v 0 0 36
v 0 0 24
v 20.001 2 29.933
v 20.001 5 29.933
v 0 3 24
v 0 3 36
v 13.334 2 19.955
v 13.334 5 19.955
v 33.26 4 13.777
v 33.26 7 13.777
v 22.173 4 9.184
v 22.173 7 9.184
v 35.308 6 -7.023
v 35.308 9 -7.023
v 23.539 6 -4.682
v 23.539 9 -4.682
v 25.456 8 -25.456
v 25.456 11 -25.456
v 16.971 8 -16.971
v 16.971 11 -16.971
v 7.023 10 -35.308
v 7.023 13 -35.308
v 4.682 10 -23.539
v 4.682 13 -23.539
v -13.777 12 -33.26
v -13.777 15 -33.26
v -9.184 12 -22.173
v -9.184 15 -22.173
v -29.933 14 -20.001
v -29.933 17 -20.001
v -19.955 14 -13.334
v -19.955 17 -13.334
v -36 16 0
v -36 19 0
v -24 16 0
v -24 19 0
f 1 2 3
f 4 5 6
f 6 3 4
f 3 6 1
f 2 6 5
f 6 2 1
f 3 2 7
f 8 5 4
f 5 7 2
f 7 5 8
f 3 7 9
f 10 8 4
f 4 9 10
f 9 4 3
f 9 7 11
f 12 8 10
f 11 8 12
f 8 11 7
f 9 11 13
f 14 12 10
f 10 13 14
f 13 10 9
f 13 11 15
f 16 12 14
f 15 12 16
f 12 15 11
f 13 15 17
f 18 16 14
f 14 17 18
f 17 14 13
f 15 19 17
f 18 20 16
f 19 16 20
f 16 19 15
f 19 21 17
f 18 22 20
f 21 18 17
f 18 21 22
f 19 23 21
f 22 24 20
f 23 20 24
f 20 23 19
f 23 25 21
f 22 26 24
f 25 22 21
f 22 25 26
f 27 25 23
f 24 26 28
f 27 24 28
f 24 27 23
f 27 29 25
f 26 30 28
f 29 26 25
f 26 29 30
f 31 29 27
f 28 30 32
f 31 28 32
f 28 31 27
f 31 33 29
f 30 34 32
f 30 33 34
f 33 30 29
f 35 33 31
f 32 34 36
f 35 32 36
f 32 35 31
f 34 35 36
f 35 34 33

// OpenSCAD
//
//
//

module spiral_ramp_section(inner_radius = 10,
                           outer_radius = 20,
                           tower_height = 20,
                           angle_start = 0,
                           angle_sweep = 20,
                           y_start = 0,
                           y_rise = 2,
                           thickness = 1,
                           part = 0)
{
    // p0 and p1 are on the right of the ramp section
    p0x = inner_radius * sin(angle_start);
    p0y = y_start;
    p0z = inner_radius * cos(angle_start);

    p1x = outer_radius * sin(angle_start);
    p1y = y_start;
    p1z = outer_radius * cos(angle_start);

    // p2 and p3 are on the left of the ramp section
    p2x = outer_radius * sin(angle_start + angle_sweep);
    p2y = y_start + y_rise;
    p2z = outer_radius * cos(angle_start + angle_sweep);

    p3x = inner_radius * sin(angle_start + angle_sweep);
    p3y = y_start + y_rise;
    p3z = inner_radius * cos(angle_start + angle_sweep);

    section_points = [[p0x, p0y, p0z], // 0
                      [p1x, p1y, p1z], // 1
                      [p2x, p2y, p2z], // 2
                      [p3x, p3y, p3z], // 3
                      [p0x, p0y + thickness, p0z], // 4
                      [p1x, p1y + thickness, p1z], // 5
                      [p2x, p2y + thickness, p2z], // 6
                      [p3x, p3y + thickness, p3z]  // 7
                      ];

    if (part == 0) {
        polyhedron(points=section_points,
                   faces=[[2, 1, 0], // bottom
                          [4, 5, 6], // top
                          [1, 2, 6, 5], // far
                          [4, 6, 2, 0], // center
                          [0, 1, 5, 4]] // right
                   );
    } else if (part == 1) {
        polyhedron(points=section_points,
                   faces=[[3, 2, 0], // bottom
                          [4, 6, 7], // top
                          [0, 4, 7, 3], // near
                          [0, 2, 6, 4], // center
                          [2, 3, 7, 6]] // left
                   );
    }
}


inner_radius = 24;
outer_radius = 36;
tower_height = 20;
thickness = 3;
angle_start = 0;
subsection_count = 4;
sections = 8;
total_angle_sweep = 270.0;
angle_sweep = total_angle_sweep / sections;
y_rise = 2;

combined = 1; // this can be overridden by the Makefile

if (combined == 1) {
    difference() {
        for(nth=[0:1:sections*2-1]) {
            spiral_ramp_section(inner_radius = inner_radius,
                                outer_radius = outer_radius,
                                tower_height = tower_height,
                                angle_start = floor( nth / 2.0 ) * angle_sweep,
                                angle_sweep = angle_sweep,
                                y_start = floor( nth / 2.0 ) * y_rise,
                                y_rise = y_rise,
                                thickness = thickness,
                                part = nth - floor( nth / 2.0 ) * 2);
        }
    }
} else {
    // do part of one pie-slice of the tower
    spiral_ramp_section(inner_radius = inner_radius,
                        outer_radius = outer_radius,
                        tower_height = tower_height,
                        angle_start = floor( nth / 2.0 ) * angle_sweep,
                        angle_sweep = angle_sweep,
                        y_start = floor( nth / 2.0 ) * y_rise,
                        y_rise = y_rise,
                        thickness = thickness,
                        part = nth - floor( nth / 2.0 ) * 2.0);
}
